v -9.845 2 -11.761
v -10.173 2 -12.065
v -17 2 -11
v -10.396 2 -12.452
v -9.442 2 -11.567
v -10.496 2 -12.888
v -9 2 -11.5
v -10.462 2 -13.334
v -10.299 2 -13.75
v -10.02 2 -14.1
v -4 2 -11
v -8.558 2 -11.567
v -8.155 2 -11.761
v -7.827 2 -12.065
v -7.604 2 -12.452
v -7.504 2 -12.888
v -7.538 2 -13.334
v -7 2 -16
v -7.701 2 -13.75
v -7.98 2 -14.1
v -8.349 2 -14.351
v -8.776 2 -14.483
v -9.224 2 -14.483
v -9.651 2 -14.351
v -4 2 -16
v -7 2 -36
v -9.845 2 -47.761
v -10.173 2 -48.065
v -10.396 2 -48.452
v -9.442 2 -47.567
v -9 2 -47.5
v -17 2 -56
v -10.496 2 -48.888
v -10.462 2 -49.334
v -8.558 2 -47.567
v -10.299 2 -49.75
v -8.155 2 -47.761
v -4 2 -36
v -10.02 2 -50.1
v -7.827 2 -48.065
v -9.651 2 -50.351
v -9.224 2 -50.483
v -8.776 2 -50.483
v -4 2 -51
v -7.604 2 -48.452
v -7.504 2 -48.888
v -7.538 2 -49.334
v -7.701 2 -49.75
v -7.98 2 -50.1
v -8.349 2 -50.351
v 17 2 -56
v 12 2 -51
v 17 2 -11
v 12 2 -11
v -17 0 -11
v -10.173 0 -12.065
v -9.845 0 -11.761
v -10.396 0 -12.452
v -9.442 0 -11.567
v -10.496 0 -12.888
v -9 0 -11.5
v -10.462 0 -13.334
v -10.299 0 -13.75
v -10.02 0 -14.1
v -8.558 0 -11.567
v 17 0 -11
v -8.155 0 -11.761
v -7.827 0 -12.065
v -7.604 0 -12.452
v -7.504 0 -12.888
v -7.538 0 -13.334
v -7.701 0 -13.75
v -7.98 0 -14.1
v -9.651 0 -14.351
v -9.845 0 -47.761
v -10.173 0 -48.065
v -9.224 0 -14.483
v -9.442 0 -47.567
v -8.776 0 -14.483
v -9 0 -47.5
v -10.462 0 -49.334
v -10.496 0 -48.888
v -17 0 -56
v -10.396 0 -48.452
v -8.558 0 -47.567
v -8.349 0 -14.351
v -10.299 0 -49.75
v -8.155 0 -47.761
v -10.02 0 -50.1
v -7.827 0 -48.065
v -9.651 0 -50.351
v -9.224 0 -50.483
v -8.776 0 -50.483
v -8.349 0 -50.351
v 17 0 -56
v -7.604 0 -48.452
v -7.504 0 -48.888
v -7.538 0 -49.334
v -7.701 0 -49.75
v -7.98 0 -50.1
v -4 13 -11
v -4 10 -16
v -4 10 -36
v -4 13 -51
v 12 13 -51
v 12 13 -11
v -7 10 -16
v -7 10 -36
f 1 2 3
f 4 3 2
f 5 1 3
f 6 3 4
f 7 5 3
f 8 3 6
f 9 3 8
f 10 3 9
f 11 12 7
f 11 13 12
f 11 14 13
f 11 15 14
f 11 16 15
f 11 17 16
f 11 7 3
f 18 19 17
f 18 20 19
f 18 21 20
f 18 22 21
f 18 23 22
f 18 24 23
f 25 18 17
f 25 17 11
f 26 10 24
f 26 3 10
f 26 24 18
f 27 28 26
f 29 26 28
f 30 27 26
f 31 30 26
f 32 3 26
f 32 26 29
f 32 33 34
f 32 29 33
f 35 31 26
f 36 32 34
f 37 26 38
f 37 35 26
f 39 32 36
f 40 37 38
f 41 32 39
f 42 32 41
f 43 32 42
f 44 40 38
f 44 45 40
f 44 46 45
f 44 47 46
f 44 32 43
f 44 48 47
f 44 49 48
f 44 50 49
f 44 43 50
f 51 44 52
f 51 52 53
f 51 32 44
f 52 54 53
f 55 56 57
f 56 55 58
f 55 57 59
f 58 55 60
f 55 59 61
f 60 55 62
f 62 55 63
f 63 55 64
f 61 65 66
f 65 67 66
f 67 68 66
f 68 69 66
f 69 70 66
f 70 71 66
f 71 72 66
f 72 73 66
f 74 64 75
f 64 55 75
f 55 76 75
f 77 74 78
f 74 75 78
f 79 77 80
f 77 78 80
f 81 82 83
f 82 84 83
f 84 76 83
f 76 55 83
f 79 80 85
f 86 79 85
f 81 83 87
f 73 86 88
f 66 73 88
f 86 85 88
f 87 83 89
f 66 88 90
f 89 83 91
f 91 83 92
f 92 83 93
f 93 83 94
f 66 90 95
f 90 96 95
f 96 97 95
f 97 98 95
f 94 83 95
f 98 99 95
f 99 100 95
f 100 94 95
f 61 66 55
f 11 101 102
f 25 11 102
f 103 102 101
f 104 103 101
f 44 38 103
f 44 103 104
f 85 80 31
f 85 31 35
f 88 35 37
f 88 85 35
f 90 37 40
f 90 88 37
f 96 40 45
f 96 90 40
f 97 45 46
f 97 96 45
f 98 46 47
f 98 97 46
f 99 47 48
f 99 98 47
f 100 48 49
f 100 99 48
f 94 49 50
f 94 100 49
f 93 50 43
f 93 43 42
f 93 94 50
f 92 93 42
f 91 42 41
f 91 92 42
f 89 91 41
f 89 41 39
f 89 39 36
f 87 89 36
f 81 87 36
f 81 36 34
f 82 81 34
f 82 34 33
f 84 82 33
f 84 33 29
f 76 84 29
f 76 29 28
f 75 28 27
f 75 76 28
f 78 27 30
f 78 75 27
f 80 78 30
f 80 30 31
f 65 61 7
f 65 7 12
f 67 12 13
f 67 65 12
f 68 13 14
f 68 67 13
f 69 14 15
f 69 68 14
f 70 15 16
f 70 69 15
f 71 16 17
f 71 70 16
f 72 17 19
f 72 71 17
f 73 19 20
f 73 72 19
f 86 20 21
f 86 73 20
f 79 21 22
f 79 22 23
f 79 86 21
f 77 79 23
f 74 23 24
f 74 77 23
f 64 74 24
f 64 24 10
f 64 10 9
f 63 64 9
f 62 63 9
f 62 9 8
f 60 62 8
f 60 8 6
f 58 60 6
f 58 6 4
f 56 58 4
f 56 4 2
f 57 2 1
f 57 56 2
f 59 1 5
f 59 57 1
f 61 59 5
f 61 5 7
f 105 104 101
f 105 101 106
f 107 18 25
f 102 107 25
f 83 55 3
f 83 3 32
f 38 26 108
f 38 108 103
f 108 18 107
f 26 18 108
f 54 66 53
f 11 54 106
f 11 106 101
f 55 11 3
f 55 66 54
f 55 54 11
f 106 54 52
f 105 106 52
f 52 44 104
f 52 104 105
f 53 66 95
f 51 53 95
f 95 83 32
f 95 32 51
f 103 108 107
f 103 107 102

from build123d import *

# Parameters (mm, degrees)
SKETCH1_W              = 34
SKETCH1_H              = 112
SKETCH1_R              = 1.5
BOARD_DEPTH            = 2
SKETCH2_W              = 16
SKETCH2_H              = 40
SKETCH2_W_2            = 6
SKETCH2_H_2            = 10
F_7SEG_DEPTH           = 11
SKETCH3_W              = 10
SKETCH3_H              = 20
SKETCH3_H_2            = 10
IC_DEPTH               = 8
SKETCH5_W              = 9
SKETCH5_H              = 17
BIENTROA_DEPTH         = 23
SKETCH6_R              = 3.4
BIENTROB_DEPTH         = 15
SKETCH7_W              = 10
SKETCH7_H              = 5
IRF540_DEPTH           = 26
SKETCH8_W              = 17
SKETCH8_H              = 10
DOMINO_DEPTH           = 10
SKETCH9_W              = 22
SKETCH9_H              = 30
EXTRUDE_7805_DEPTH     = 30
SPLIT2_SURFACE_1_BACK  = 127.76
SPLIT2_SURFACE_1_DEPTH = 255.52
SPLIT2_SURFACE_2_BACK  = 127.76
SPLIT2_SURFACE_2_DEPTH = 255.52


with BuildPart() as part:
    # Sketch1 → Board (new body)
    with BuildSketch(Plane(origin=(0, 0, 0), x_dir=(1, 0, 0), z_dir=(0, 1, 0))):
        Rectangle(SKETCH1_W, SKETCH1_H)
        with Locations(Location((13.6, -52.6, 0), (0, 0, 270))):
            Circle(SKETCH1_R, mode=Mode.SUBTRACT)
        with Locations(Location((-9, 49, 0), (0, 0, 270))):
            Circle(SKETCH1_R, mode=Mode.SUBTRACT)
        with Locations(Location((-9, 13, 0), (0, 0, 270))):
            Circle(SKETCH1_R, mode=Mode.SUBTRACT)
    extrude(amount=BOARD_DEPTH)

    # Sketch2 → 7SEG (add)
    with BuildSketch(Plane(origin=(0, 2, 0), x_dir=(1, 0, 0), z_dir=(0, 1, 0))):
        with Locations((4, 31)):
            Rectangle(SKETCH2_W, SKETCH2_H)
        with Locations((8, 5)):
            Rectangle(SKETCH2_W_2, SKETCH2_H_2)
    extrude(amount=F_7SEG_DEPTH)

    # Sketch3 → IC (add)
    with BuildSketch(Plane(origin=(0, 2, 0), x_dir=(1, 0, 0), z_dir=(0, 1, 0))):
        with Locations((-2, 26)):
            Rectangle(SKETCH3_W, SKETCH3_H)
        with Locations((4, 5)):
            Rectangle(SKETCH3_W, SKETCH3_H_2)
        with Locations((4, -17)):
            Rectangle(SKETCH3_W, SKETCH3_H_2)
    extrude(amount=IC_DEPTH)

    # Sketch5 → BienTroA (add)
    with BuildSketch(Plane(origin=(0, 2, 0), x_dir=(1, 0, 0), z_dir=(0, 1, 0))):
        with Locations((6.5, -14.5)):
            Rectangle(SKETCH5_W, SKETCH5_H)
    extrude(amount=BIENTROA_DEPTH)

    # Sketch6 → BienTroB (add)
    with BuildSketch(Plane(origin=(11, 0, 0), x_dir=(0, 0, -1), z_dir=(1, 0, 0))):
        with Locations(Location((-14.5, 16.6, 0), (0, 0, 180))):
            Circle(SKETCH6_R)
    extrude(amount=BIENTROB_DEPTH)

    # Sketch7 → IRF540 (add)
    with BuildSketch(Plane(origin=(0, 2, 0), x_dir=(1, 0, 0), z_dir=(0, 1, 0))):
        with Locations((5, -47.5)):
            Rectangle(SKETCH7_W, SKETCH7_H)
    extrude(amount=IRF540_DEPTH)

    # Sketch8 → Domino (add)
    with BuildSketch(Plane(origin=(0, 2, 0), x_dir=(1, 0, 0), z_dir=(0, 1, 0))):
        with Locations((-2.5, -50)):
            Rectangle(SKETCH8_W, SKETCH8_H)
    extrude(amount=DOMINO_DEPTH)

    # Sketch9 → 7805 (add)
    with BuildSketch(Plane(origin=(0, 2, 0), x_dir=(1, 0, 0), z_dir=(0, 1, 0))):
        with Locations((-13, -26)):
            Rectangle(SKETCH9_W, SKETCH9_H)
    extrude(amount=EXTRUDE_7805_DEPTH)


with BuildPart() as body_2:
    # Split2: the piece behind the surface
    add(part.part)
    # Split2 surface: a surface, the sketch's curves swept straight by 255.52 mm
    with BuildLine(Plane(origin=(0, 2, 0), x_dir=(1, 0, 0), z_dir=(0, 1, 0)).offset(-SPLIT2_SURFACE_1_BACK), mode=Mode.PRIVATE) as split2_surface_1_path:
        Line((17, 11), (-17, 11))
    split2_surface_1 = Shell.extrude(split2_surface_1_path.wire(), (0 * SPLIT2_SURFACE_1_DEPTH, 1 * SPLIT2_SURFACE_1_DEPTH, 0 * SPLIT2_SURFACE_1_DEPTH))
    split(bisect_by=split2_surface_1, keep=Keep.BOTTOM)


with BuildPart() as part_1:
    add(part.part)

    # Split2: split by a surface, the side it looks to stays
    # Split2 surface: a surface, the sketch's curves swept straight by 255.52 mm
    with BuildLine(Plane(origin=(0, 2, 0), x_dir=(1, 0, 0), z_dir=(0, 1, 0)).offset(-SPLIT2_SURFACE_2_BACK), mode=Mode.PRIVATE) as split2_surface_2_path:
        Line((17, 11), (-17, 11))
    split2_surface_2 = Shell.extrude(split2_surface_2_path.wire(), (0 * SPLIT2_SURFACE_2_DEPTH, 1 * SPLIT2_SURFACE_2_DEPTH, 0 * SPLIT2_SURFACE_2_DEPTH))
    split(bisect_by=split2_surface_2, keep=Keep.TOP)


solid = body_2.part
